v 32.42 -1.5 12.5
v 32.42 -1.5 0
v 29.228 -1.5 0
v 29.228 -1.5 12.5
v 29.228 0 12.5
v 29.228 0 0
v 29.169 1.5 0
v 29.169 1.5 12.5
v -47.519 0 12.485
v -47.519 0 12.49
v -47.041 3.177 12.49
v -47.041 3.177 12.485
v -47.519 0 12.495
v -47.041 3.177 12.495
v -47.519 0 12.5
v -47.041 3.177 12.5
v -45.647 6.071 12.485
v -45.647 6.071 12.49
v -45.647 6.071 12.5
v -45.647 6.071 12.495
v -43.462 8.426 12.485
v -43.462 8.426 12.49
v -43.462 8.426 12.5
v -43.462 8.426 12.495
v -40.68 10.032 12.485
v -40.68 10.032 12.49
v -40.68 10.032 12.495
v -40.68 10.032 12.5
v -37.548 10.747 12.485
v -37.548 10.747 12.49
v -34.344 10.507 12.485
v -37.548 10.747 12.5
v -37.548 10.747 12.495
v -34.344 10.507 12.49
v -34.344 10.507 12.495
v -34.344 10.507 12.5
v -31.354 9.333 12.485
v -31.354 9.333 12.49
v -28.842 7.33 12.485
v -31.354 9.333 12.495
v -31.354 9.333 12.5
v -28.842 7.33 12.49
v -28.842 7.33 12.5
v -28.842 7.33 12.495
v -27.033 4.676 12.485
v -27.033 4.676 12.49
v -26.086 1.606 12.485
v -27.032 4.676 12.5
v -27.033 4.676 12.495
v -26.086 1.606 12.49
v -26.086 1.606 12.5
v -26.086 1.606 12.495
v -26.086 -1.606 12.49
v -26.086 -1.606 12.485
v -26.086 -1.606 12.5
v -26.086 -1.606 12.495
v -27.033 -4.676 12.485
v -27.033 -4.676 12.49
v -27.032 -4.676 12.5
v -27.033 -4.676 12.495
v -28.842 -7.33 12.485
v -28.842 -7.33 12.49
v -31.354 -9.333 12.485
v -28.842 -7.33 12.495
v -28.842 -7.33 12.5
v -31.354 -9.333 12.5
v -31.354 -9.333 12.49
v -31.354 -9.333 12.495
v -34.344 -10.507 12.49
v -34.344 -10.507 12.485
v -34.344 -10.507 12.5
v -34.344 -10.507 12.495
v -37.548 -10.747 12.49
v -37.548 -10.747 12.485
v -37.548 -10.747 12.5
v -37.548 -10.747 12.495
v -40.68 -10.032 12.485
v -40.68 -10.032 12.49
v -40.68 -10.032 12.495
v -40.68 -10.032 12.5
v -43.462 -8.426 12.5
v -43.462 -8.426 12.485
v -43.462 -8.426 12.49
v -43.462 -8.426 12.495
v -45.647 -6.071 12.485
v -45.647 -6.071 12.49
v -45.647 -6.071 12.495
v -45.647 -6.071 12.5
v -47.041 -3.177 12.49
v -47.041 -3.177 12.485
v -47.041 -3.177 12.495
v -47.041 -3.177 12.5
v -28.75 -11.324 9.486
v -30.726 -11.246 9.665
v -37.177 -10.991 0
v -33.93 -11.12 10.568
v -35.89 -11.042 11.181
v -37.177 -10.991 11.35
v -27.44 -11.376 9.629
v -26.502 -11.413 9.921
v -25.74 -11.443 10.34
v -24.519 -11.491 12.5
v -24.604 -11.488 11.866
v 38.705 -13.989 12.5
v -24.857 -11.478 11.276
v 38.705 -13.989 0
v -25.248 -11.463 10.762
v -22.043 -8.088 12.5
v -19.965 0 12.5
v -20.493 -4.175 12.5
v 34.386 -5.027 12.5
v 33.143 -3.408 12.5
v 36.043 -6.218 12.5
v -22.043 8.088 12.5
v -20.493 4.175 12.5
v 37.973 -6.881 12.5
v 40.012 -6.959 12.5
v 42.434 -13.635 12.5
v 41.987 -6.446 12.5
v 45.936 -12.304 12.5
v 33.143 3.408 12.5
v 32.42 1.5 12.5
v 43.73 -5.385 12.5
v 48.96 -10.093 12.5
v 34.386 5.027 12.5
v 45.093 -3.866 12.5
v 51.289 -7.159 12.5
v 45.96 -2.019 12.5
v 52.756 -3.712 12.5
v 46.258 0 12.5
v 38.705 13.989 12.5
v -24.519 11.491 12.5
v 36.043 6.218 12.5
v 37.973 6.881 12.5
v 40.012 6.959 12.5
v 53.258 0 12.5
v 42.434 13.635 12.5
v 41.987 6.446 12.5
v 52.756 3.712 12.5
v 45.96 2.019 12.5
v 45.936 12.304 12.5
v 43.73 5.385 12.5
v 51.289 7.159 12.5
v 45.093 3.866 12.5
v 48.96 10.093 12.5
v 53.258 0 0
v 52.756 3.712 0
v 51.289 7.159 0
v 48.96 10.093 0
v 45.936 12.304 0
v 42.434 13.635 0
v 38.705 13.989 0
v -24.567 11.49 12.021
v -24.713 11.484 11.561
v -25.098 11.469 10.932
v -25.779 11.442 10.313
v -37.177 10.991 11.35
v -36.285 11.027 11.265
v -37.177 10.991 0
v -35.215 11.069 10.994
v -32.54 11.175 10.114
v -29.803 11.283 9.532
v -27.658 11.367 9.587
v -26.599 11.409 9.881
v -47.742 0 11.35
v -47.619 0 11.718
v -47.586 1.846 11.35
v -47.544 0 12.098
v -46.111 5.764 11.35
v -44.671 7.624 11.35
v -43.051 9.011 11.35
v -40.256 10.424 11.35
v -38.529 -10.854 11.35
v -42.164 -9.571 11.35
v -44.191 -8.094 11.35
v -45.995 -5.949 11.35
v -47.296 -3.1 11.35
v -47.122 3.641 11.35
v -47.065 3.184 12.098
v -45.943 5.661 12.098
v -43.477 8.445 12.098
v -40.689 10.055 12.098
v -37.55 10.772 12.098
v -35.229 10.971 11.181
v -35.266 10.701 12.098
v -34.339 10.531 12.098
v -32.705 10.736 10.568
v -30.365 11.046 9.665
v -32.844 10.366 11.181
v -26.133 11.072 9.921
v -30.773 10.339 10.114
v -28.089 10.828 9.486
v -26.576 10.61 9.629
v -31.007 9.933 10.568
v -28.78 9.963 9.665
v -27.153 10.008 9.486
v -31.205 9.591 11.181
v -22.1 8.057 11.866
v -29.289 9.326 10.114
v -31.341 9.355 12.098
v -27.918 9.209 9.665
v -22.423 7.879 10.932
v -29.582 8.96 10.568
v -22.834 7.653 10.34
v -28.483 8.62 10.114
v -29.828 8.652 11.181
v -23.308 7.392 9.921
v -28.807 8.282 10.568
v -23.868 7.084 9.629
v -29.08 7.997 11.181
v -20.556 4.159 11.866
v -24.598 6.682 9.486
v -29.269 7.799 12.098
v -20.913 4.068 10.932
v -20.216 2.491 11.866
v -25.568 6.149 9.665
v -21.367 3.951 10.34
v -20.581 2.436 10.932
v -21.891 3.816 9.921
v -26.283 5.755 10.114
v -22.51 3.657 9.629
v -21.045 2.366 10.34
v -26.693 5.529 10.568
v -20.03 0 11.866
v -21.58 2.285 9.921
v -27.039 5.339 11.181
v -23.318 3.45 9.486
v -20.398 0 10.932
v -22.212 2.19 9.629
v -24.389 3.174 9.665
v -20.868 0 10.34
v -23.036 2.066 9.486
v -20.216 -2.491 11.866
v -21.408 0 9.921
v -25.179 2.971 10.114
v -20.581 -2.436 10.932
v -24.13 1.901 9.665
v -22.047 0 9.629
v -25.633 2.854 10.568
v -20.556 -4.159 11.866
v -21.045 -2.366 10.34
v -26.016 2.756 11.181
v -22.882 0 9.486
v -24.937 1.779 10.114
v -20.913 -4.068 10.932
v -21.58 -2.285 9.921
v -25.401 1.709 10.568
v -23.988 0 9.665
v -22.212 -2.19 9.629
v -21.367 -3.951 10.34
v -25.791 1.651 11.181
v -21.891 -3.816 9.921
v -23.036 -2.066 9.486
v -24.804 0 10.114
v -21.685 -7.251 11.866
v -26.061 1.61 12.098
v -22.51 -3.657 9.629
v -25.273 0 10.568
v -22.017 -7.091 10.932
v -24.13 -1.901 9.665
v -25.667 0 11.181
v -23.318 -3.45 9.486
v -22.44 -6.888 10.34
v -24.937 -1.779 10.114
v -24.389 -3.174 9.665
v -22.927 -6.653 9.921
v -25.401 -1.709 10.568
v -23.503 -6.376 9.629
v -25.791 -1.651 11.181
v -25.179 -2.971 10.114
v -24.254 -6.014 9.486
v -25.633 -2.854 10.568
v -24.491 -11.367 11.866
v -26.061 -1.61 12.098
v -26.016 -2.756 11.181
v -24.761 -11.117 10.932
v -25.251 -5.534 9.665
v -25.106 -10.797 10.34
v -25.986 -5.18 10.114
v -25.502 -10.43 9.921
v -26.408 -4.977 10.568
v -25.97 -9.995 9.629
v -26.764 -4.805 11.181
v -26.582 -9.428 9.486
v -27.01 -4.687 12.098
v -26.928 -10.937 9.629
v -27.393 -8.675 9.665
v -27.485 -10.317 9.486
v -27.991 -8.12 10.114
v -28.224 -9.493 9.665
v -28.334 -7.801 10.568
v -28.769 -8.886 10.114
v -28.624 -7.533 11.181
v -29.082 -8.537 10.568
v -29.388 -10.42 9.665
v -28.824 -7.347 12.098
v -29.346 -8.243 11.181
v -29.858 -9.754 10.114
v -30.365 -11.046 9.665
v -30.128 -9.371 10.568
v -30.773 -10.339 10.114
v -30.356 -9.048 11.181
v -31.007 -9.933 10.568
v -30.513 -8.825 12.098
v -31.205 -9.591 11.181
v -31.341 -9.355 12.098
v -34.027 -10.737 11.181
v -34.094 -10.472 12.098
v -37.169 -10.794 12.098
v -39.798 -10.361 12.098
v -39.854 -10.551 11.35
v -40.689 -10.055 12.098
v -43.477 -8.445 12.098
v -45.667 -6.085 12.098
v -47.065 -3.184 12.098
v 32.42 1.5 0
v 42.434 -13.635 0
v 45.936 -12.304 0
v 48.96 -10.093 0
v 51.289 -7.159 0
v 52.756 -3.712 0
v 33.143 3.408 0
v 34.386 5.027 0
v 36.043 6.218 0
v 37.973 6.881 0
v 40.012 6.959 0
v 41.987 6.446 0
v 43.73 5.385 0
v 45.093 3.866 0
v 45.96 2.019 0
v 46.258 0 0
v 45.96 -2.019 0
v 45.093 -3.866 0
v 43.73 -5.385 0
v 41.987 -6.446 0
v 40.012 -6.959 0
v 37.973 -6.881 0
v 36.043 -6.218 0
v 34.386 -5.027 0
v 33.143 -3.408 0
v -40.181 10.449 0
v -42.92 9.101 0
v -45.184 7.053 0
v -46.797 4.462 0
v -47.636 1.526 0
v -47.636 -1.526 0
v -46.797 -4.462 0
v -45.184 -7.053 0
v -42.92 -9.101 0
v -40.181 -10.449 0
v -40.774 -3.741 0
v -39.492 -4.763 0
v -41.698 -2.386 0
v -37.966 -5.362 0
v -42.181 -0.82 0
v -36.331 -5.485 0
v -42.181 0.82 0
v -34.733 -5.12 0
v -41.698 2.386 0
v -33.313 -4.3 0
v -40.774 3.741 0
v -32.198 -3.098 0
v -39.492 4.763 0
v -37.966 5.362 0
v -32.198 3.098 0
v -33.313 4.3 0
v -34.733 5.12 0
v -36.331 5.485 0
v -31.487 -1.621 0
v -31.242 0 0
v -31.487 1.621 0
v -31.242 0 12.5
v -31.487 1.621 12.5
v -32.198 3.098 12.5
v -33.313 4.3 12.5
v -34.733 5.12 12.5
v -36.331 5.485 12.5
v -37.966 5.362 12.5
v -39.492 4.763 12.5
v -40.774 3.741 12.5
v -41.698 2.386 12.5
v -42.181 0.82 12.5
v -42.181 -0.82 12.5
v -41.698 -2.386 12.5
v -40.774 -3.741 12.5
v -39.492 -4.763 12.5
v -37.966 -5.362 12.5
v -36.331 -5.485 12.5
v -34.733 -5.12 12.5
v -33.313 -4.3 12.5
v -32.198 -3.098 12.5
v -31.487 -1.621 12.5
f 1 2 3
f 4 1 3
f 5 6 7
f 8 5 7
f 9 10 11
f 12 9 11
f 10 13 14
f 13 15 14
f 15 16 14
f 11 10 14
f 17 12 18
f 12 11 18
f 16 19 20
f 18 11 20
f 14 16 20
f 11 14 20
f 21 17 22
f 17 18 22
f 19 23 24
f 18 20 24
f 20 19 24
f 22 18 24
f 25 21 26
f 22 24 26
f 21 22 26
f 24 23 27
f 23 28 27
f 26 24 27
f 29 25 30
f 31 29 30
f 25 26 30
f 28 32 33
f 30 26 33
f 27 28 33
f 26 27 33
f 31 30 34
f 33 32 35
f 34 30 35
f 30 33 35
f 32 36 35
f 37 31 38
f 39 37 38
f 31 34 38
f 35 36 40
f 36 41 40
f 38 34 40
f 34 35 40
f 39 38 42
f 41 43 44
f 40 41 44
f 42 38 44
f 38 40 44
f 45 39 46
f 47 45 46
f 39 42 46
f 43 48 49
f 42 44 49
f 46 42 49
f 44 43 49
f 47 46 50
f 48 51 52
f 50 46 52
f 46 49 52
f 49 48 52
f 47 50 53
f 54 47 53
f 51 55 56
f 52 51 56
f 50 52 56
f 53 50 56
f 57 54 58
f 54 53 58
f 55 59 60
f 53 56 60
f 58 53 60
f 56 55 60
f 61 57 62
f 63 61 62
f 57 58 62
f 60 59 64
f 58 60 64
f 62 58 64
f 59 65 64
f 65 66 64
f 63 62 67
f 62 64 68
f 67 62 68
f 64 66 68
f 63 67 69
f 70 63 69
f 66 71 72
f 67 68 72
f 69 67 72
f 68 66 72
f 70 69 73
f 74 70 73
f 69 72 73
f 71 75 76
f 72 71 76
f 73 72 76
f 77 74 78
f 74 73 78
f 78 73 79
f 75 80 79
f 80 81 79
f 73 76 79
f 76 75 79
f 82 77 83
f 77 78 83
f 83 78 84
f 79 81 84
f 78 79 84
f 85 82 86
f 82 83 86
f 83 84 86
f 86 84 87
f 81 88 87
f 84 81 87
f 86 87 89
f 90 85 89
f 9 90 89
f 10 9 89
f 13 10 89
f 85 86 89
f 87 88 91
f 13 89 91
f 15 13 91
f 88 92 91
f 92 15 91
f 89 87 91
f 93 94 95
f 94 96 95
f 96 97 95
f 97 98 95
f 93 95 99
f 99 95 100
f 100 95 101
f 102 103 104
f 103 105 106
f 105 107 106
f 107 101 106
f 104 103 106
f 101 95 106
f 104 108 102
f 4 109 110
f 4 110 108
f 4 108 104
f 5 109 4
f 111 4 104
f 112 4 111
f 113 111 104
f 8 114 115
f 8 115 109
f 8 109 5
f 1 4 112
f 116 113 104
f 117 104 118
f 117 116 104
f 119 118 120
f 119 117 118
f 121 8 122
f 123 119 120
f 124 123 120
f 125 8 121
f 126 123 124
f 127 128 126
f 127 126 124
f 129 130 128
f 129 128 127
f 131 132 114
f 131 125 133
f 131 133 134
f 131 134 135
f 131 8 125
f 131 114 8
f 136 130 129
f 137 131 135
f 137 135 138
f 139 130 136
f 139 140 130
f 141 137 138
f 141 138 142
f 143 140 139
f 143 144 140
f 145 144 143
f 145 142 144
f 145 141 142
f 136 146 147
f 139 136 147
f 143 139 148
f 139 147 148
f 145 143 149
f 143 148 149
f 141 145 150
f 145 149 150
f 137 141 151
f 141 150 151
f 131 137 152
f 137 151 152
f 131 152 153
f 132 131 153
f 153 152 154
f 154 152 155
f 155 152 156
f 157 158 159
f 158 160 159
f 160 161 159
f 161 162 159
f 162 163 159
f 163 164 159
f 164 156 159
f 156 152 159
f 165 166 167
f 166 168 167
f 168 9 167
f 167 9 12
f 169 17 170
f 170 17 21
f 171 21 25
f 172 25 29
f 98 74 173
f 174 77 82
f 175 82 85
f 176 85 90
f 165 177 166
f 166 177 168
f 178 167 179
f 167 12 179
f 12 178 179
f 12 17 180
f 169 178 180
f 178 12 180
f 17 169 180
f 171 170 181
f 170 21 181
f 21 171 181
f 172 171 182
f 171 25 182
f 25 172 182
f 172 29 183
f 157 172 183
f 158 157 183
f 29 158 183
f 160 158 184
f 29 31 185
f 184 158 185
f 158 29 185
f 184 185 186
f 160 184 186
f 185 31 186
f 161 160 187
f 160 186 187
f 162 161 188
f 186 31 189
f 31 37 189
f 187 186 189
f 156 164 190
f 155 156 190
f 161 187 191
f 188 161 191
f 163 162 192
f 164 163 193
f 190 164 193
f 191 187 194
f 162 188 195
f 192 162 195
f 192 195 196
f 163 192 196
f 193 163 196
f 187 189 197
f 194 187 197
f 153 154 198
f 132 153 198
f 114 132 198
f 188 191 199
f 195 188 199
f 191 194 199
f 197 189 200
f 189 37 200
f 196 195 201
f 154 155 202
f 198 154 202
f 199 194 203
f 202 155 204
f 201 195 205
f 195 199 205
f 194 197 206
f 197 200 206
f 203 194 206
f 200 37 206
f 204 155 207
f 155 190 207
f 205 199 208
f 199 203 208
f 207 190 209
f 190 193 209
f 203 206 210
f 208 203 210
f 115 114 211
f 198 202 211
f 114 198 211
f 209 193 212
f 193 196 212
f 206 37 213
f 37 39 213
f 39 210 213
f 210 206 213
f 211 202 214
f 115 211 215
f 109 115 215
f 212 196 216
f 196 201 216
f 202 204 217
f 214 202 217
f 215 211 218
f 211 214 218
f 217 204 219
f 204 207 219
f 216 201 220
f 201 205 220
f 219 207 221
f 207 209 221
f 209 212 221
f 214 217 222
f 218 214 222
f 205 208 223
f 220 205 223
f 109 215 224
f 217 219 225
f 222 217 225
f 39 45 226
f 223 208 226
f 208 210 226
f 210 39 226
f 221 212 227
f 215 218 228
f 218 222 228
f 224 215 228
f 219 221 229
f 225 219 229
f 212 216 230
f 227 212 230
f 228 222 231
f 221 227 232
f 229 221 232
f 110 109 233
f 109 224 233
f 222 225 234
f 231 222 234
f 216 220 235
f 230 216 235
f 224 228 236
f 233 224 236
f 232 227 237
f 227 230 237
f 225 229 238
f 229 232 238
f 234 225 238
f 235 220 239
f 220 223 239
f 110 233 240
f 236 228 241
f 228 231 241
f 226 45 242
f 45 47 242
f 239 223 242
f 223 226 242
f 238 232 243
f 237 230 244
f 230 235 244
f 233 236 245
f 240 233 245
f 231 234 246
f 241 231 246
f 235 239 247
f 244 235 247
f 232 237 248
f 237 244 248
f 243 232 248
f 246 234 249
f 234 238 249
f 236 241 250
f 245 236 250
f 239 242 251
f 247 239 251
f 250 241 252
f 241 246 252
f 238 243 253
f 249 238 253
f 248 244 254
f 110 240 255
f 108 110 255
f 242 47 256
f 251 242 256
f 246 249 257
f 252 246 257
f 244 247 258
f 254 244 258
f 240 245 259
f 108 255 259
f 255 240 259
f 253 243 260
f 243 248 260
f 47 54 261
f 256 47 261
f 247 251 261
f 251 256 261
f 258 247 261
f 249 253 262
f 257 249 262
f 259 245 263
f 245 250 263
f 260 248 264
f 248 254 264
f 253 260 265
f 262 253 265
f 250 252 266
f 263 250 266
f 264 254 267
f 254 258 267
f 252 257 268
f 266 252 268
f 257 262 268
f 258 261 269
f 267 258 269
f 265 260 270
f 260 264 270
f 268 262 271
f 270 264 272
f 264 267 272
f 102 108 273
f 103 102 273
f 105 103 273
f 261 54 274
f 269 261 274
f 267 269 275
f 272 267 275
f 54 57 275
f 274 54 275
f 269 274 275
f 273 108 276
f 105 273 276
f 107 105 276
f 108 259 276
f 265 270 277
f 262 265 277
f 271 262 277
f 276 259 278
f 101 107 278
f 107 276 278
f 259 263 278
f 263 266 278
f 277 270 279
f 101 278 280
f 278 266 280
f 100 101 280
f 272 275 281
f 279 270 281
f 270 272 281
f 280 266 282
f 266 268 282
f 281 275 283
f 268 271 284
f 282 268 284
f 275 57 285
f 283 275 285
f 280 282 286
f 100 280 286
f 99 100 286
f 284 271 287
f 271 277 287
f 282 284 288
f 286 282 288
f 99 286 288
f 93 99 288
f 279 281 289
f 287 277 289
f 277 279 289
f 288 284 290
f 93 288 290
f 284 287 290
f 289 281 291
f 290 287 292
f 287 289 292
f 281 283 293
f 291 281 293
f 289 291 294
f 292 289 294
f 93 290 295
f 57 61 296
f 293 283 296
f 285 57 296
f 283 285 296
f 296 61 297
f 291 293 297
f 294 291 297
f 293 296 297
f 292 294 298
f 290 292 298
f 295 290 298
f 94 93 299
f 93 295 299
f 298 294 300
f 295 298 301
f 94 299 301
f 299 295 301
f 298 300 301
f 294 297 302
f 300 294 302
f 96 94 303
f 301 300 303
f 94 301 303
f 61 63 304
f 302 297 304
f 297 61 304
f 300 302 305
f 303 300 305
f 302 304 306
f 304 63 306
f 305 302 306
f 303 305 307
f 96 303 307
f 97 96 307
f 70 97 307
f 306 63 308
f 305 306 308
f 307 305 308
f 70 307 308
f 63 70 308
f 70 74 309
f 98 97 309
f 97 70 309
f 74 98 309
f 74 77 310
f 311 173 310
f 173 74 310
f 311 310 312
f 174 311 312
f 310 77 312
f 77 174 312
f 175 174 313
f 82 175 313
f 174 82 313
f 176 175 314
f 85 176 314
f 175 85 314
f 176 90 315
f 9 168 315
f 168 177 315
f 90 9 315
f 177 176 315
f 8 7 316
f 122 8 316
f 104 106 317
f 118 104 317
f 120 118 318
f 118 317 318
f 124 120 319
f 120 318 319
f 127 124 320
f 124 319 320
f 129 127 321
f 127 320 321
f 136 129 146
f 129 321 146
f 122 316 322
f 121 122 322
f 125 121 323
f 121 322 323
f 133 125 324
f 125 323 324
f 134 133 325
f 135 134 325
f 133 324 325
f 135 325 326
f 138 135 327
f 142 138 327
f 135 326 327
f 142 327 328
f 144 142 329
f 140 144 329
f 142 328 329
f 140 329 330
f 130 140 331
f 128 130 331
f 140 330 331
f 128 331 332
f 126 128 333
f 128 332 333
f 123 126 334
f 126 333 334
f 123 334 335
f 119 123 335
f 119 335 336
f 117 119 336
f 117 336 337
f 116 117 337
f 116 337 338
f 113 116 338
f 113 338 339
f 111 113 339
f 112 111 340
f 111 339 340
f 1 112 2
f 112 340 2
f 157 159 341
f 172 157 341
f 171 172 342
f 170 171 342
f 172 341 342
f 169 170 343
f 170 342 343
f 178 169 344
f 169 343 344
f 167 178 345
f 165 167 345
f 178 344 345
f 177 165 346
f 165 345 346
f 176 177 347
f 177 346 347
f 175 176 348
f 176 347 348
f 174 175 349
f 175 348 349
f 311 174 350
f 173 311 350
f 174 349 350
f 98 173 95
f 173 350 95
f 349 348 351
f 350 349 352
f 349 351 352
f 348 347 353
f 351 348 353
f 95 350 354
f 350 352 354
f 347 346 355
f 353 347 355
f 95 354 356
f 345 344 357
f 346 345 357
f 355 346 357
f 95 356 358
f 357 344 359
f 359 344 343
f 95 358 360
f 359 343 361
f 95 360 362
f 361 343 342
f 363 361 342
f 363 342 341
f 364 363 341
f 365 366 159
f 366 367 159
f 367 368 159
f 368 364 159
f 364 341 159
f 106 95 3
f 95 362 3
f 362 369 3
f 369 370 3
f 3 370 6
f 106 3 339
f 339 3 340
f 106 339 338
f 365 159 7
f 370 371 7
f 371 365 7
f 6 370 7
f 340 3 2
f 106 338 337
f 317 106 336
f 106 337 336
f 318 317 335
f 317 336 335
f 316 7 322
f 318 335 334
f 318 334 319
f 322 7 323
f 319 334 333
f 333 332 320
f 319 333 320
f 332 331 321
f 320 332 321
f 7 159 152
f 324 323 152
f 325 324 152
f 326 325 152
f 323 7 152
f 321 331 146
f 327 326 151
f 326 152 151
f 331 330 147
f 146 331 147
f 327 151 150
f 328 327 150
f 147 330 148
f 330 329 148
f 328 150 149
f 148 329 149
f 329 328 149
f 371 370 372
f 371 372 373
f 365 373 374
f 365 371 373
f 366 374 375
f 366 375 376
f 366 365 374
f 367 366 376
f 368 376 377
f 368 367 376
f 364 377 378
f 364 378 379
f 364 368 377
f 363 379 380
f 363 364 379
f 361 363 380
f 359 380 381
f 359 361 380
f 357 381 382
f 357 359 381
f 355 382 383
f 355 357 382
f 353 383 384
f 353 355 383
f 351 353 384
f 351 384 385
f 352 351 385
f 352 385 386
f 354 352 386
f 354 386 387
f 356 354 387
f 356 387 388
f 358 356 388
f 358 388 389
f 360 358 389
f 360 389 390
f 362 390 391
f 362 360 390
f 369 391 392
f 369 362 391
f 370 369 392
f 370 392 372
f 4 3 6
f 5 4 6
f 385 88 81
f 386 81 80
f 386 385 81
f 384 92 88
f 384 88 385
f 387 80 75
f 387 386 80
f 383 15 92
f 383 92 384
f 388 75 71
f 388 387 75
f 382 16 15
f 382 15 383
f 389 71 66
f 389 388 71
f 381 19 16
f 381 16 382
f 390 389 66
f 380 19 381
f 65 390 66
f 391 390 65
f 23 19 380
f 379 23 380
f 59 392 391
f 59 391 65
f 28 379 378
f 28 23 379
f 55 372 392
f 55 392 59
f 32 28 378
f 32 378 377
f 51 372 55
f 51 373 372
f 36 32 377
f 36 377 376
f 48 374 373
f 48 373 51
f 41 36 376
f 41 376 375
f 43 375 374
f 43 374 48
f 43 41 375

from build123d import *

# Parameters (mm, degrees)
F0_R     = 5.5
F1_DEPTH = 12.5
F2_R     = 3


with BuildPart() as f1:
    # F0 (on Top) → F1 (new body)
    with BuildSketch(Plane.XY):
        with BuildLine():
            ThreePointArc((-37.176539, -10.991427), (-29.119216, -7.930205), (-25.742329, 0))
            ThreePointArc((-25.742329, 0), (-29.119216, 7.930205), (-37.176539, 10.991427))
            ThreePointArc((-37.176539, 10.991427), (-47.742329, 0), (-37.176539, -10.991427))
        make_face()
        with Locations((-36.742329, 0)):
            Circle(F0_R, mode=Mode.SUBTRACT)
        with BuildLine():
            ThreePointArc((53.257671, 0), (48.959814, 10.092989), (38.70504, 13.989089))
            ThreePointArc((38.70504, 13.989089), (25.257671, 0), (38.70504, -13.989089))
            ThreePointArc((38.70504, -13.989089), (48.959814, -10.092989), (53.257671, 0))
        make_face()
        with BuildLine():
            ThreePointArc((32.420274, 1.5), (46.257671, 0), (32.420274, -1.5))
            Line((32.420274, -1.5), (29.227967, -1.5))
            Line((29.227967, -1.5), (29.227967, 0))
            Line((29.227967, 0), (29.168711, 1.5))
            Line((29.168711, 1.5), (32.420274, 1.5))
        make_face(mode=Mode.SUBTRACT)
        with BuildLine():
            ThreePointArc((-37.176539, 10.991427), (-29.119216, 7.930205), (-25.742329, 0))
            ThreePointArc((-25.742329, 0), (-29.119216, -7.930205), (-37.176539, -10.991427))
            Line((-37.176539, -10.991427), (38.70504, -13.989089))
            ThreePointArc((38.70504, -13.989089), (25.257671, 0), (38.70504, 13.989089))
            Line((38.70504, 13.989089), (-37.176539, 10.991427))
        make_face()
    extrude(amount=F1_DEPTH)

    # F2 (on Front) → F3 (revolve, cut)
    with BuildSketch(Plane.XZ):
        with Locations((-50.519399, 12.484903)):
            Circle(F2_R)
    revolve(axis=Axis((-36.742329, 0, 0), (0, 0, -1)), mode=Mode.SUBTRACT)


solid = f1.part
